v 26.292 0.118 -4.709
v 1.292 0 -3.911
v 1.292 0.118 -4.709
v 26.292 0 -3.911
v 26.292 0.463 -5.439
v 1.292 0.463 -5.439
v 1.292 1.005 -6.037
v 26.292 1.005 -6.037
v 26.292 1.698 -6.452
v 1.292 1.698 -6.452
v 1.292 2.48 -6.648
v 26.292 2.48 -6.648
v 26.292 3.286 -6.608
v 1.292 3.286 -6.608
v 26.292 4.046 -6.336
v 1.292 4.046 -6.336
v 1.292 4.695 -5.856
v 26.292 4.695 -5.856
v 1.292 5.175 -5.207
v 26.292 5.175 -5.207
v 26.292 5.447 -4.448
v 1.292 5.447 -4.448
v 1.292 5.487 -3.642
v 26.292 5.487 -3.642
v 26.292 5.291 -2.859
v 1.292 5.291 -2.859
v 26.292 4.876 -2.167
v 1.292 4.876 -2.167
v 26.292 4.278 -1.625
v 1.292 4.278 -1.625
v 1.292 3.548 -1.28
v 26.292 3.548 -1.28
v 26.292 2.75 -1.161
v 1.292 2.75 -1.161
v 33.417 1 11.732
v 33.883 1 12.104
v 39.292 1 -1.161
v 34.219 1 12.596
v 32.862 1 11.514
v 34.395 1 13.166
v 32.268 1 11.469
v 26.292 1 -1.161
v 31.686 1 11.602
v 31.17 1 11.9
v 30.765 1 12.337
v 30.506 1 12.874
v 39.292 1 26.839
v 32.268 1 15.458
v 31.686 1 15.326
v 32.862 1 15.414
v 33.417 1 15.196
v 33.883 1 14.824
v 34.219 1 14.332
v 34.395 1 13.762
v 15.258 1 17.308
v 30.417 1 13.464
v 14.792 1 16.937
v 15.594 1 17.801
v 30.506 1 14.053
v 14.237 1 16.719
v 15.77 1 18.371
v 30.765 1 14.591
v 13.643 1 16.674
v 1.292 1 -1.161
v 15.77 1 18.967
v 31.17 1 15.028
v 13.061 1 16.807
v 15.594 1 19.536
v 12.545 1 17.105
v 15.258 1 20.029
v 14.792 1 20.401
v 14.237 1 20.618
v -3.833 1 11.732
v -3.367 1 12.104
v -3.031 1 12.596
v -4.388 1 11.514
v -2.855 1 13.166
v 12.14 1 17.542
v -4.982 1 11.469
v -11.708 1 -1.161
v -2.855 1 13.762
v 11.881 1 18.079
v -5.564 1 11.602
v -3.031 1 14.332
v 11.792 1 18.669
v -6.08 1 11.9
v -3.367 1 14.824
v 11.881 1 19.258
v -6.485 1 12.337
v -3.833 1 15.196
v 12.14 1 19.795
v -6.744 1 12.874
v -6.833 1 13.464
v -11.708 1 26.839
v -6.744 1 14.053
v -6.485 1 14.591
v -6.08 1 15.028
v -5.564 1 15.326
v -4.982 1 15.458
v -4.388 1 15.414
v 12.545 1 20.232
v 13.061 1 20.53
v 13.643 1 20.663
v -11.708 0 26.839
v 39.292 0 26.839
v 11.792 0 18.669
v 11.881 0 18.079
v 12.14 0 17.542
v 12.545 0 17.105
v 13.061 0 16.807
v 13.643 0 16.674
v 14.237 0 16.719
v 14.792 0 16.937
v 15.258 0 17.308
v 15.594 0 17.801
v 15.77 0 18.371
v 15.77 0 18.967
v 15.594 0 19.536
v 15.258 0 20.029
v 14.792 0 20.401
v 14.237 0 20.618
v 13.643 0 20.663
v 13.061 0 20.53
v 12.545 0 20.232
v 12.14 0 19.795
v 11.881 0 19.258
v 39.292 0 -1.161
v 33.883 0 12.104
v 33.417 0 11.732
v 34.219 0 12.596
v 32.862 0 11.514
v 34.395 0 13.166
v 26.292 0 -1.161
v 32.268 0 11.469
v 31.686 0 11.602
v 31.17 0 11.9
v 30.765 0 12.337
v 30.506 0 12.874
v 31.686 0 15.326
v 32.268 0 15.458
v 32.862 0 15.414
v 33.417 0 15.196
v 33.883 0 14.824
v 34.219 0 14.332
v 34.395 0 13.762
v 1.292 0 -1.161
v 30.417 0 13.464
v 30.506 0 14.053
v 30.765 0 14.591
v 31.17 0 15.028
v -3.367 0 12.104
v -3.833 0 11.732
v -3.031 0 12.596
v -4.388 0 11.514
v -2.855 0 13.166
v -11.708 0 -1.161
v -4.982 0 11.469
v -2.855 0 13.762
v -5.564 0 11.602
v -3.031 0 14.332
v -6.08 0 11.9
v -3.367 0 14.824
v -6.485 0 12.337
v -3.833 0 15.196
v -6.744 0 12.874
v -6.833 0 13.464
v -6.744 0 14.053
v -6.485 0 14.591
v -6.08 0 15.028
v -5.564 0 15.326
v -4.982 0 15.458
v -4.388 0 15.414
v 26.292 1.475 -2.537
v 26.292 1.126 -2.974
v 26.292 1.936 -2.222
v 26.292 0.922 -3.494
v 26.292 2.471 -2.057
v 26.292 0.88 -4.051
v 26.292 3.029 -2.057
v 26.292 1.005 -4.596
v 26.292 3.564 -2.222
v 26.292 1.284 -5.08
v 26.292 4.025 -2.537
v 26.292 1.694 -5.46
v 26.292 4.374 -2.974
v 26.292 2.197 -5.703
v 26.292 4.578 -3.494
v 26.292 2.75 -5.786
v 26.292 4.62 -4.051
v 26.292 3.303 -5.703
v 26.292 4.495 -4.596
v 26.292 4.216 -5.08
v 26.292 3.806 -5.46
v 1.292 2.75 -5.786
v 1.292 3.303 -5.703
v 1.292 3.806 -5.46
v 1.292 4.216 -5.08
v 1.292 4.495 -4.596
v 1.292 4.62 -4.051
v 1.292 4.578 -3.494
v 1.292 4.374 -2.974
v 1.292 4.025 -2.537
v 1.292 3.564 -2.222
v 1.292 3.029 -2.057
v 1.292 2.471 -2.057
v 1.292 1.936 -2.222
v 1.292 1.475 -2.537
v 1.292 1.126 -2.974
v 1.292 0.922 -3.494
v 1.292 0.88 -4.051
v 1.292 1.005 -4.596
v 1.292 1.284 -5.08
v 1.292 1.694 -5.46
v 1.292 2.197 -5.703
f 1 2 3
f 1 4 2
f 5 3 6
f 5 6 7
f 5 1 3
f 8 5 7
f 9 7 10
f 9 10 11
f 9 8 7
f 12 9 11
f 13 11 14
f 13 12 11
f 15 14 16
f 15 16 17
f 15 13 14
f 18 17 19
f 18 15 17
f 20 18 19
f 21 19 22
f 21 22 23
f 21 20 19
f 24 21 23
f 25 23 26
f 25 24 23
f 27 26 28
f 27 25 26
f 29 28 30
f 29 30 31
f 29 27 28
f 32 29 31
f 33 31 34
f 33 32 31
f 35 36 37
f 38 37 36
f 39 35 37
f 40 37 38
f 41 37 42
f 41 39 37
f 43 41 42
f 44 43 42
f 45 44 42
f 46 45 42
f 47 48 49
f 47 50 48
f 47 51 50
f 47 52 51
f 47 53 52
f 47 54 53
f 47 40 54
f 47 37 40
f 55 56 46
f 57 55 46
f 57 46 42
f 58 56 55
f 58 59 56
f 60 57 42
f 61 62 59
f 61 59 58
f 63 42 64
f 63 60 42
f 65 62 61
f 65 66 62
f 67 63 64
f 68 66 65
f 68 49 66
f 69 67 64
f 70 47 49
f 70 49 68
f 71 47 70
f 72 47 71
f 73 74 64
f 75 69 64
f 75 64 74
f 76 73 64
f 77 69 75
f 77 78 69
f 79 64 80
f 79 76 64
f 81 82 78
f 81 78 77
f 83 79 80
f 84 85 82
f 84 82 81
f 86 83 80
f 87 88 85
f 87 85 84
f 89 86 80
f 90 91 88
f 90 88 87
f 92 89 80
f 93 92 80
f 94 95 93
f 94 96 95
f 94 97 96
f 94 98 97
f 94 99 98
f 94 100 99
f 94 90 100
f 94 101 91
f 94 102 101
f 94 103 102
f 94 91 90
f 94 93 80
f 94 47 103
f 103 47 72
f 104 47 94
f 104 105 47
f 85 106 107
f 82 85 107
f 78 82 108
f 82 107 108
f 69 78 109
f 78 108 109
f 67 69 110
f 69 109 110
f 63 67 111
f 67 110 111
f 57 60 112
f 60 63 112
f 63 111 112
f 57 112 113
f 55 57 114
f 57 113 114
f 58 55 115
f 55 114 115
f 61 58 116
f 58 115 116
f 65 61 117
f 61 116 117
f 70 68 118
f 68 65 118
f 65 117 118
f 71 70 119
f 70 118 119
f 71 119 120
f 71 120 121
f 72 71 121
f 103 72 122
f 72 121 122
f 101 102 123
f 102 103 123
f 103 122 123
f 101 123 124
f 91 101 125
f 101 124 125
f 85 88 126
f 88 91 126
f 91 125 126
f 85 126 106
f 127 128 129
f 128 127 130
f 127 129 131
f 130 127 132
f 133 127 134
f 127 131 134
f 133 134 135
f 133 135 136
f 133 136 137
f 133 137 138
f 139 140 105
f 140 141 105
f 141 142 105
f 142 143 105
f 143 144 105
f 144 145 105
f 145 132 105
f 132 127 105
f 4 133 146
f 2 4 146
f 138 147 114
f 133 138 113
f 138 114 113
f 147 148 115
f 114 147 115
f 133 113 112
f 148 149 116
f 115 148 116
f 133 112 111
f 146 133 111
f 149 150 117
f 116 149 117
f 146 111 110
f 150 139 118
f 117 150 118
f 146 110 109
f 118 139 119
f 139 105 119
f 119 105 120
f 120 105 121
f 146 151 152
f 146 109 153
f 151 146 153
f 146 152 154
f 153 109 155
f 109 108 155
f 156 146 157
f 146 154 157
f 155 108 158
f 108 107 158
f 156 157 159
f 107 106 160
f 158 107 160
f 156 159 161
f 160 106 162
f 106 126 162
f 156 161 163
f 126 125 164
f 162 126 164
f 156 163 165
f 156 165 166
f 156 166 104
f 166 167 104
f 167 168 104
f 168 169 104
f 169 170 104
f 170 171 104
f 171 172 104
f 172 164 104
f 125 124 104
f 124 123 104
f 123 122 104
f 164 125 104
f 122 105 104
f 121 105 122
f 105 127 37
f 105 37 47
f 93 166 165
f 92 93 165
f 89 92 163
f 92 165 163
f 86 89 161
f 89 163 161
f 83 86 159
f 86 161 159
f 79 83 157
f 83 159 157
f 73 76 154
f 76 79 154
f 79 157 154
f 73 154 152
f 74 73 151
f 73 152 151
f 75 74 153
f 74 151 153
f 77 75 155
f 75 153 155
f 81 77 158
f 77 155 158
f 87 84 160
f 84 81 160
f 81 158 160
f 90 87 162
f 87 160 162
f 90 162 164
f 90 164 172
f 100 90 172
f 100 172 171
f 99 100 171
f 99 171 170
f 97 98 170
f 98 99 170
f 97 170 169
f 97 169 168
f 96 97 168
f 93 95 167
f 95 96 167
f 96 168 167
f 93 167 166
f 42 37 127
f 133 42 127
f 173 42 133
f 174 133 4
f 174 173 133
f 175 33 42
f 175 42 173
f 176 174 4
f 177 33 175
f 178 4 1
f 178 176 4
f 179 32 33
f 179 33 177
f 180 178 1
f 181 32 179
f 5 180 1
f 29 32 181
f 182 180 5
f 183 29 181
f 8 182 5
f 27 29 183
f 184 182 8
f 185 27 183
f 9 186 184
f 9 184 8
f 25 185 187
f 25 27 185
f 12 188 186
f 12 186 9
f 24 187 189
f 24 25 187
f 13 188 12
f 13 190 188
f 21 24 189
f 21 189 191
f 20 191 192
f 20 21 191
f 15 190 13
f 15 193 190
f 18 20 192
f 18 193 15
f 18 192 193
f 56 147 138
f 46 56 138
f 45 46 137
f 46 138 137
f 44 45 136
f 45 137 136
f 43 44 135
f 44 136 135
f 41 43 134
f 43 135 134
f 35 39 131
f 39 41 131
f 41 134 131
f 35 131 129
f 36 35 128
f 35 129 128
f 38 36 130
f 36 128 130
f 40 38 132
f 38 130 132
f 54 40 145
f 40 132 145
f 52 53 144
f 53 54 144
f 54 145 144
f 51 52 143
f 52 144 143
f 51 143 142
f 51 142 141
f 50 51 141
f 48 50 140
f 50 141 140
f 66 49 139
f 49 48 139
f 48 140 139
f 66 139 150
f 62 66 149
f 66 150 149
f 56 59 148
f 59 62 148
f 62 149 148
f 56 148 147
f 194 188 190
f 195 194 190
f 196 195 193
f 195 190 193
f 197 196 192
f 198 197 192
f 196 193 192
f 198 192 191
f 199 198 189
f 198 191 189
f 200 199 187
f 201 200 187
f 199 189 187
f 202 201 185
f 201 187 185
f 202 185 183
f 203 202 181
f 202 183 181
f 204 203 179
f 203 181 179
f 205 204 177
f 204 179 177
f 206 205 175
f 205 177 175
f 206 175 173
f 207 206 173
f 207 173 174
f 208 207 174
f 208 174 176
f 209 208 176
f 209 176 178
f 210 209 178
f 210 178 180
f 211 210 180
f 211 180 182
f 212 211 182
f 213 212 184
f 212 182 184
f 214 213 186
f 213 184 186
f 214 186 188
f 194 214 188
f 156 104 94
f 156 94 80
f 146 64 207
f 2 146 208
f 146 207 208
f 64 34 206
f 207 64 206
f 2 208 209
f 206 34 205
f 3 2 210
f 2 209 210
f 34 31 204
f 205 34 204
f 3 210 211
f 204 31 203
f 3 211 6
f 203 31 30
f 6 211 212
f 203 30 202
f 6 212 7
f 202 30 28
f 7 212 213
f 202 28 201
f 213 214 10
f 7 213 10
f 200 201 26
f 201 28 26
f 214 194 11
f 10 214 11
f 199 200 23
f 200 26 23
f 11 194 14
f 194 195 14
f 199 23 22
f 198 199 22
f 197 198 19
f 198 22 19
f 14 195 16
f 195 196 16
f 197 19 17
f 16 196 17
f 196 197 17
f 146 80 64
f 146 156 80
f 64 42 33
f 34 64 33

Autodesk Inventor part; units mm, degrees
ref_plane "YZ Plane" through (0, 0, 0) normal (1, 0, 0) x (0, 1, 0)
ref_plane "XZ Plane" through (0, 0, 0) normal (0, 1, 0) x (-1, 0, 0)
ref_plane "XY Plane" through (0, 0, 0) normal (0, 0, 1) x (1, 0, 0)
sketch "Boceto1" plane through (0, 0, 0) normal (0, 1, 0) x (-1, 0, 0)
  line L0 (11.708, 26.8389) -> (11.708, -1.1611)
  line L1 (11.708, -1.1611) -> (-39.292, -1.1611)
  line L2 (-39.292, -1.1611) -> (-39.292, 26.8389)
  line L3 (-39.292, 26.8389) -> (11.708, 26.8389)
  circle A0 centre (4.833, 13.4639) radius 2
  circle A1 centre (-32.417, 13.4639) radius 2
  circle A2 centre (-13.792, 18.6686) radius 2
  point P0 (0, 0)
  point P1 (0, 0)
  dimension "d0" = 28
  dimension "d1" = 51
  dimension "d2" = 4
  dimension "d3" = 4
  dimension "d4" = 4
  dimension "d5" = 25.5
  dimension "d6" = 6.875
  dimension "d7" = 13.375
  dimension "d8" = 6.875
  dimension "d9" = 13.375
extrude "Extrusión1" add sketch "Boceto1" along normal blind 1
sketch "Boceto2" plane through (39.292, 0, 26.8389) normal (1, 0, 0) x (0, 0, -1)
  arc A0 (30.75, 0) -> (28, 2.75) centre (30.75, 2.75) ccw
  circle A1 centre (30.75, 2.75) radius 1.875
  line L0 (0, 0) -> (28, 0) projected
  line L1 (28, 0) -> (28, 1) projected
  line L2 (28, 0) -> (30.75, 0)
  line L3 (28, 0) -> (28, 2.75)
  point P0 (26.8389, 0)
  dimension "d12" = 5.5
  dimension "d13" = 3.75
extrude "Extrusión2" add sketch "Boceto2" against normal blind 38
sketch "Boceto3" plane through (39.292, 0, 26.8389) normal (1, 0, 0) x (0, 0, -1)
  circle A0 centre (30.75, 2.75) radius 1.875 projected
  arc A1 (30.75, 0) -> (28, 2.75) centre (30.75, 2.75) ccw
  arc A2 (30.75, 0) -> (28, 2.75) centre (30.75, 2.75) ccw projected
  line L0 (28, 2.75) -> (28, 0)
  line L1 (28, 0) -> (30.75, 0)
  point P0 (26.8389, 0)
extrude "Extrusión3" cut sketch "Boceto3" against normal blind 13
properties part number "Ala 2 Bisagra tipo Libro Grande"
